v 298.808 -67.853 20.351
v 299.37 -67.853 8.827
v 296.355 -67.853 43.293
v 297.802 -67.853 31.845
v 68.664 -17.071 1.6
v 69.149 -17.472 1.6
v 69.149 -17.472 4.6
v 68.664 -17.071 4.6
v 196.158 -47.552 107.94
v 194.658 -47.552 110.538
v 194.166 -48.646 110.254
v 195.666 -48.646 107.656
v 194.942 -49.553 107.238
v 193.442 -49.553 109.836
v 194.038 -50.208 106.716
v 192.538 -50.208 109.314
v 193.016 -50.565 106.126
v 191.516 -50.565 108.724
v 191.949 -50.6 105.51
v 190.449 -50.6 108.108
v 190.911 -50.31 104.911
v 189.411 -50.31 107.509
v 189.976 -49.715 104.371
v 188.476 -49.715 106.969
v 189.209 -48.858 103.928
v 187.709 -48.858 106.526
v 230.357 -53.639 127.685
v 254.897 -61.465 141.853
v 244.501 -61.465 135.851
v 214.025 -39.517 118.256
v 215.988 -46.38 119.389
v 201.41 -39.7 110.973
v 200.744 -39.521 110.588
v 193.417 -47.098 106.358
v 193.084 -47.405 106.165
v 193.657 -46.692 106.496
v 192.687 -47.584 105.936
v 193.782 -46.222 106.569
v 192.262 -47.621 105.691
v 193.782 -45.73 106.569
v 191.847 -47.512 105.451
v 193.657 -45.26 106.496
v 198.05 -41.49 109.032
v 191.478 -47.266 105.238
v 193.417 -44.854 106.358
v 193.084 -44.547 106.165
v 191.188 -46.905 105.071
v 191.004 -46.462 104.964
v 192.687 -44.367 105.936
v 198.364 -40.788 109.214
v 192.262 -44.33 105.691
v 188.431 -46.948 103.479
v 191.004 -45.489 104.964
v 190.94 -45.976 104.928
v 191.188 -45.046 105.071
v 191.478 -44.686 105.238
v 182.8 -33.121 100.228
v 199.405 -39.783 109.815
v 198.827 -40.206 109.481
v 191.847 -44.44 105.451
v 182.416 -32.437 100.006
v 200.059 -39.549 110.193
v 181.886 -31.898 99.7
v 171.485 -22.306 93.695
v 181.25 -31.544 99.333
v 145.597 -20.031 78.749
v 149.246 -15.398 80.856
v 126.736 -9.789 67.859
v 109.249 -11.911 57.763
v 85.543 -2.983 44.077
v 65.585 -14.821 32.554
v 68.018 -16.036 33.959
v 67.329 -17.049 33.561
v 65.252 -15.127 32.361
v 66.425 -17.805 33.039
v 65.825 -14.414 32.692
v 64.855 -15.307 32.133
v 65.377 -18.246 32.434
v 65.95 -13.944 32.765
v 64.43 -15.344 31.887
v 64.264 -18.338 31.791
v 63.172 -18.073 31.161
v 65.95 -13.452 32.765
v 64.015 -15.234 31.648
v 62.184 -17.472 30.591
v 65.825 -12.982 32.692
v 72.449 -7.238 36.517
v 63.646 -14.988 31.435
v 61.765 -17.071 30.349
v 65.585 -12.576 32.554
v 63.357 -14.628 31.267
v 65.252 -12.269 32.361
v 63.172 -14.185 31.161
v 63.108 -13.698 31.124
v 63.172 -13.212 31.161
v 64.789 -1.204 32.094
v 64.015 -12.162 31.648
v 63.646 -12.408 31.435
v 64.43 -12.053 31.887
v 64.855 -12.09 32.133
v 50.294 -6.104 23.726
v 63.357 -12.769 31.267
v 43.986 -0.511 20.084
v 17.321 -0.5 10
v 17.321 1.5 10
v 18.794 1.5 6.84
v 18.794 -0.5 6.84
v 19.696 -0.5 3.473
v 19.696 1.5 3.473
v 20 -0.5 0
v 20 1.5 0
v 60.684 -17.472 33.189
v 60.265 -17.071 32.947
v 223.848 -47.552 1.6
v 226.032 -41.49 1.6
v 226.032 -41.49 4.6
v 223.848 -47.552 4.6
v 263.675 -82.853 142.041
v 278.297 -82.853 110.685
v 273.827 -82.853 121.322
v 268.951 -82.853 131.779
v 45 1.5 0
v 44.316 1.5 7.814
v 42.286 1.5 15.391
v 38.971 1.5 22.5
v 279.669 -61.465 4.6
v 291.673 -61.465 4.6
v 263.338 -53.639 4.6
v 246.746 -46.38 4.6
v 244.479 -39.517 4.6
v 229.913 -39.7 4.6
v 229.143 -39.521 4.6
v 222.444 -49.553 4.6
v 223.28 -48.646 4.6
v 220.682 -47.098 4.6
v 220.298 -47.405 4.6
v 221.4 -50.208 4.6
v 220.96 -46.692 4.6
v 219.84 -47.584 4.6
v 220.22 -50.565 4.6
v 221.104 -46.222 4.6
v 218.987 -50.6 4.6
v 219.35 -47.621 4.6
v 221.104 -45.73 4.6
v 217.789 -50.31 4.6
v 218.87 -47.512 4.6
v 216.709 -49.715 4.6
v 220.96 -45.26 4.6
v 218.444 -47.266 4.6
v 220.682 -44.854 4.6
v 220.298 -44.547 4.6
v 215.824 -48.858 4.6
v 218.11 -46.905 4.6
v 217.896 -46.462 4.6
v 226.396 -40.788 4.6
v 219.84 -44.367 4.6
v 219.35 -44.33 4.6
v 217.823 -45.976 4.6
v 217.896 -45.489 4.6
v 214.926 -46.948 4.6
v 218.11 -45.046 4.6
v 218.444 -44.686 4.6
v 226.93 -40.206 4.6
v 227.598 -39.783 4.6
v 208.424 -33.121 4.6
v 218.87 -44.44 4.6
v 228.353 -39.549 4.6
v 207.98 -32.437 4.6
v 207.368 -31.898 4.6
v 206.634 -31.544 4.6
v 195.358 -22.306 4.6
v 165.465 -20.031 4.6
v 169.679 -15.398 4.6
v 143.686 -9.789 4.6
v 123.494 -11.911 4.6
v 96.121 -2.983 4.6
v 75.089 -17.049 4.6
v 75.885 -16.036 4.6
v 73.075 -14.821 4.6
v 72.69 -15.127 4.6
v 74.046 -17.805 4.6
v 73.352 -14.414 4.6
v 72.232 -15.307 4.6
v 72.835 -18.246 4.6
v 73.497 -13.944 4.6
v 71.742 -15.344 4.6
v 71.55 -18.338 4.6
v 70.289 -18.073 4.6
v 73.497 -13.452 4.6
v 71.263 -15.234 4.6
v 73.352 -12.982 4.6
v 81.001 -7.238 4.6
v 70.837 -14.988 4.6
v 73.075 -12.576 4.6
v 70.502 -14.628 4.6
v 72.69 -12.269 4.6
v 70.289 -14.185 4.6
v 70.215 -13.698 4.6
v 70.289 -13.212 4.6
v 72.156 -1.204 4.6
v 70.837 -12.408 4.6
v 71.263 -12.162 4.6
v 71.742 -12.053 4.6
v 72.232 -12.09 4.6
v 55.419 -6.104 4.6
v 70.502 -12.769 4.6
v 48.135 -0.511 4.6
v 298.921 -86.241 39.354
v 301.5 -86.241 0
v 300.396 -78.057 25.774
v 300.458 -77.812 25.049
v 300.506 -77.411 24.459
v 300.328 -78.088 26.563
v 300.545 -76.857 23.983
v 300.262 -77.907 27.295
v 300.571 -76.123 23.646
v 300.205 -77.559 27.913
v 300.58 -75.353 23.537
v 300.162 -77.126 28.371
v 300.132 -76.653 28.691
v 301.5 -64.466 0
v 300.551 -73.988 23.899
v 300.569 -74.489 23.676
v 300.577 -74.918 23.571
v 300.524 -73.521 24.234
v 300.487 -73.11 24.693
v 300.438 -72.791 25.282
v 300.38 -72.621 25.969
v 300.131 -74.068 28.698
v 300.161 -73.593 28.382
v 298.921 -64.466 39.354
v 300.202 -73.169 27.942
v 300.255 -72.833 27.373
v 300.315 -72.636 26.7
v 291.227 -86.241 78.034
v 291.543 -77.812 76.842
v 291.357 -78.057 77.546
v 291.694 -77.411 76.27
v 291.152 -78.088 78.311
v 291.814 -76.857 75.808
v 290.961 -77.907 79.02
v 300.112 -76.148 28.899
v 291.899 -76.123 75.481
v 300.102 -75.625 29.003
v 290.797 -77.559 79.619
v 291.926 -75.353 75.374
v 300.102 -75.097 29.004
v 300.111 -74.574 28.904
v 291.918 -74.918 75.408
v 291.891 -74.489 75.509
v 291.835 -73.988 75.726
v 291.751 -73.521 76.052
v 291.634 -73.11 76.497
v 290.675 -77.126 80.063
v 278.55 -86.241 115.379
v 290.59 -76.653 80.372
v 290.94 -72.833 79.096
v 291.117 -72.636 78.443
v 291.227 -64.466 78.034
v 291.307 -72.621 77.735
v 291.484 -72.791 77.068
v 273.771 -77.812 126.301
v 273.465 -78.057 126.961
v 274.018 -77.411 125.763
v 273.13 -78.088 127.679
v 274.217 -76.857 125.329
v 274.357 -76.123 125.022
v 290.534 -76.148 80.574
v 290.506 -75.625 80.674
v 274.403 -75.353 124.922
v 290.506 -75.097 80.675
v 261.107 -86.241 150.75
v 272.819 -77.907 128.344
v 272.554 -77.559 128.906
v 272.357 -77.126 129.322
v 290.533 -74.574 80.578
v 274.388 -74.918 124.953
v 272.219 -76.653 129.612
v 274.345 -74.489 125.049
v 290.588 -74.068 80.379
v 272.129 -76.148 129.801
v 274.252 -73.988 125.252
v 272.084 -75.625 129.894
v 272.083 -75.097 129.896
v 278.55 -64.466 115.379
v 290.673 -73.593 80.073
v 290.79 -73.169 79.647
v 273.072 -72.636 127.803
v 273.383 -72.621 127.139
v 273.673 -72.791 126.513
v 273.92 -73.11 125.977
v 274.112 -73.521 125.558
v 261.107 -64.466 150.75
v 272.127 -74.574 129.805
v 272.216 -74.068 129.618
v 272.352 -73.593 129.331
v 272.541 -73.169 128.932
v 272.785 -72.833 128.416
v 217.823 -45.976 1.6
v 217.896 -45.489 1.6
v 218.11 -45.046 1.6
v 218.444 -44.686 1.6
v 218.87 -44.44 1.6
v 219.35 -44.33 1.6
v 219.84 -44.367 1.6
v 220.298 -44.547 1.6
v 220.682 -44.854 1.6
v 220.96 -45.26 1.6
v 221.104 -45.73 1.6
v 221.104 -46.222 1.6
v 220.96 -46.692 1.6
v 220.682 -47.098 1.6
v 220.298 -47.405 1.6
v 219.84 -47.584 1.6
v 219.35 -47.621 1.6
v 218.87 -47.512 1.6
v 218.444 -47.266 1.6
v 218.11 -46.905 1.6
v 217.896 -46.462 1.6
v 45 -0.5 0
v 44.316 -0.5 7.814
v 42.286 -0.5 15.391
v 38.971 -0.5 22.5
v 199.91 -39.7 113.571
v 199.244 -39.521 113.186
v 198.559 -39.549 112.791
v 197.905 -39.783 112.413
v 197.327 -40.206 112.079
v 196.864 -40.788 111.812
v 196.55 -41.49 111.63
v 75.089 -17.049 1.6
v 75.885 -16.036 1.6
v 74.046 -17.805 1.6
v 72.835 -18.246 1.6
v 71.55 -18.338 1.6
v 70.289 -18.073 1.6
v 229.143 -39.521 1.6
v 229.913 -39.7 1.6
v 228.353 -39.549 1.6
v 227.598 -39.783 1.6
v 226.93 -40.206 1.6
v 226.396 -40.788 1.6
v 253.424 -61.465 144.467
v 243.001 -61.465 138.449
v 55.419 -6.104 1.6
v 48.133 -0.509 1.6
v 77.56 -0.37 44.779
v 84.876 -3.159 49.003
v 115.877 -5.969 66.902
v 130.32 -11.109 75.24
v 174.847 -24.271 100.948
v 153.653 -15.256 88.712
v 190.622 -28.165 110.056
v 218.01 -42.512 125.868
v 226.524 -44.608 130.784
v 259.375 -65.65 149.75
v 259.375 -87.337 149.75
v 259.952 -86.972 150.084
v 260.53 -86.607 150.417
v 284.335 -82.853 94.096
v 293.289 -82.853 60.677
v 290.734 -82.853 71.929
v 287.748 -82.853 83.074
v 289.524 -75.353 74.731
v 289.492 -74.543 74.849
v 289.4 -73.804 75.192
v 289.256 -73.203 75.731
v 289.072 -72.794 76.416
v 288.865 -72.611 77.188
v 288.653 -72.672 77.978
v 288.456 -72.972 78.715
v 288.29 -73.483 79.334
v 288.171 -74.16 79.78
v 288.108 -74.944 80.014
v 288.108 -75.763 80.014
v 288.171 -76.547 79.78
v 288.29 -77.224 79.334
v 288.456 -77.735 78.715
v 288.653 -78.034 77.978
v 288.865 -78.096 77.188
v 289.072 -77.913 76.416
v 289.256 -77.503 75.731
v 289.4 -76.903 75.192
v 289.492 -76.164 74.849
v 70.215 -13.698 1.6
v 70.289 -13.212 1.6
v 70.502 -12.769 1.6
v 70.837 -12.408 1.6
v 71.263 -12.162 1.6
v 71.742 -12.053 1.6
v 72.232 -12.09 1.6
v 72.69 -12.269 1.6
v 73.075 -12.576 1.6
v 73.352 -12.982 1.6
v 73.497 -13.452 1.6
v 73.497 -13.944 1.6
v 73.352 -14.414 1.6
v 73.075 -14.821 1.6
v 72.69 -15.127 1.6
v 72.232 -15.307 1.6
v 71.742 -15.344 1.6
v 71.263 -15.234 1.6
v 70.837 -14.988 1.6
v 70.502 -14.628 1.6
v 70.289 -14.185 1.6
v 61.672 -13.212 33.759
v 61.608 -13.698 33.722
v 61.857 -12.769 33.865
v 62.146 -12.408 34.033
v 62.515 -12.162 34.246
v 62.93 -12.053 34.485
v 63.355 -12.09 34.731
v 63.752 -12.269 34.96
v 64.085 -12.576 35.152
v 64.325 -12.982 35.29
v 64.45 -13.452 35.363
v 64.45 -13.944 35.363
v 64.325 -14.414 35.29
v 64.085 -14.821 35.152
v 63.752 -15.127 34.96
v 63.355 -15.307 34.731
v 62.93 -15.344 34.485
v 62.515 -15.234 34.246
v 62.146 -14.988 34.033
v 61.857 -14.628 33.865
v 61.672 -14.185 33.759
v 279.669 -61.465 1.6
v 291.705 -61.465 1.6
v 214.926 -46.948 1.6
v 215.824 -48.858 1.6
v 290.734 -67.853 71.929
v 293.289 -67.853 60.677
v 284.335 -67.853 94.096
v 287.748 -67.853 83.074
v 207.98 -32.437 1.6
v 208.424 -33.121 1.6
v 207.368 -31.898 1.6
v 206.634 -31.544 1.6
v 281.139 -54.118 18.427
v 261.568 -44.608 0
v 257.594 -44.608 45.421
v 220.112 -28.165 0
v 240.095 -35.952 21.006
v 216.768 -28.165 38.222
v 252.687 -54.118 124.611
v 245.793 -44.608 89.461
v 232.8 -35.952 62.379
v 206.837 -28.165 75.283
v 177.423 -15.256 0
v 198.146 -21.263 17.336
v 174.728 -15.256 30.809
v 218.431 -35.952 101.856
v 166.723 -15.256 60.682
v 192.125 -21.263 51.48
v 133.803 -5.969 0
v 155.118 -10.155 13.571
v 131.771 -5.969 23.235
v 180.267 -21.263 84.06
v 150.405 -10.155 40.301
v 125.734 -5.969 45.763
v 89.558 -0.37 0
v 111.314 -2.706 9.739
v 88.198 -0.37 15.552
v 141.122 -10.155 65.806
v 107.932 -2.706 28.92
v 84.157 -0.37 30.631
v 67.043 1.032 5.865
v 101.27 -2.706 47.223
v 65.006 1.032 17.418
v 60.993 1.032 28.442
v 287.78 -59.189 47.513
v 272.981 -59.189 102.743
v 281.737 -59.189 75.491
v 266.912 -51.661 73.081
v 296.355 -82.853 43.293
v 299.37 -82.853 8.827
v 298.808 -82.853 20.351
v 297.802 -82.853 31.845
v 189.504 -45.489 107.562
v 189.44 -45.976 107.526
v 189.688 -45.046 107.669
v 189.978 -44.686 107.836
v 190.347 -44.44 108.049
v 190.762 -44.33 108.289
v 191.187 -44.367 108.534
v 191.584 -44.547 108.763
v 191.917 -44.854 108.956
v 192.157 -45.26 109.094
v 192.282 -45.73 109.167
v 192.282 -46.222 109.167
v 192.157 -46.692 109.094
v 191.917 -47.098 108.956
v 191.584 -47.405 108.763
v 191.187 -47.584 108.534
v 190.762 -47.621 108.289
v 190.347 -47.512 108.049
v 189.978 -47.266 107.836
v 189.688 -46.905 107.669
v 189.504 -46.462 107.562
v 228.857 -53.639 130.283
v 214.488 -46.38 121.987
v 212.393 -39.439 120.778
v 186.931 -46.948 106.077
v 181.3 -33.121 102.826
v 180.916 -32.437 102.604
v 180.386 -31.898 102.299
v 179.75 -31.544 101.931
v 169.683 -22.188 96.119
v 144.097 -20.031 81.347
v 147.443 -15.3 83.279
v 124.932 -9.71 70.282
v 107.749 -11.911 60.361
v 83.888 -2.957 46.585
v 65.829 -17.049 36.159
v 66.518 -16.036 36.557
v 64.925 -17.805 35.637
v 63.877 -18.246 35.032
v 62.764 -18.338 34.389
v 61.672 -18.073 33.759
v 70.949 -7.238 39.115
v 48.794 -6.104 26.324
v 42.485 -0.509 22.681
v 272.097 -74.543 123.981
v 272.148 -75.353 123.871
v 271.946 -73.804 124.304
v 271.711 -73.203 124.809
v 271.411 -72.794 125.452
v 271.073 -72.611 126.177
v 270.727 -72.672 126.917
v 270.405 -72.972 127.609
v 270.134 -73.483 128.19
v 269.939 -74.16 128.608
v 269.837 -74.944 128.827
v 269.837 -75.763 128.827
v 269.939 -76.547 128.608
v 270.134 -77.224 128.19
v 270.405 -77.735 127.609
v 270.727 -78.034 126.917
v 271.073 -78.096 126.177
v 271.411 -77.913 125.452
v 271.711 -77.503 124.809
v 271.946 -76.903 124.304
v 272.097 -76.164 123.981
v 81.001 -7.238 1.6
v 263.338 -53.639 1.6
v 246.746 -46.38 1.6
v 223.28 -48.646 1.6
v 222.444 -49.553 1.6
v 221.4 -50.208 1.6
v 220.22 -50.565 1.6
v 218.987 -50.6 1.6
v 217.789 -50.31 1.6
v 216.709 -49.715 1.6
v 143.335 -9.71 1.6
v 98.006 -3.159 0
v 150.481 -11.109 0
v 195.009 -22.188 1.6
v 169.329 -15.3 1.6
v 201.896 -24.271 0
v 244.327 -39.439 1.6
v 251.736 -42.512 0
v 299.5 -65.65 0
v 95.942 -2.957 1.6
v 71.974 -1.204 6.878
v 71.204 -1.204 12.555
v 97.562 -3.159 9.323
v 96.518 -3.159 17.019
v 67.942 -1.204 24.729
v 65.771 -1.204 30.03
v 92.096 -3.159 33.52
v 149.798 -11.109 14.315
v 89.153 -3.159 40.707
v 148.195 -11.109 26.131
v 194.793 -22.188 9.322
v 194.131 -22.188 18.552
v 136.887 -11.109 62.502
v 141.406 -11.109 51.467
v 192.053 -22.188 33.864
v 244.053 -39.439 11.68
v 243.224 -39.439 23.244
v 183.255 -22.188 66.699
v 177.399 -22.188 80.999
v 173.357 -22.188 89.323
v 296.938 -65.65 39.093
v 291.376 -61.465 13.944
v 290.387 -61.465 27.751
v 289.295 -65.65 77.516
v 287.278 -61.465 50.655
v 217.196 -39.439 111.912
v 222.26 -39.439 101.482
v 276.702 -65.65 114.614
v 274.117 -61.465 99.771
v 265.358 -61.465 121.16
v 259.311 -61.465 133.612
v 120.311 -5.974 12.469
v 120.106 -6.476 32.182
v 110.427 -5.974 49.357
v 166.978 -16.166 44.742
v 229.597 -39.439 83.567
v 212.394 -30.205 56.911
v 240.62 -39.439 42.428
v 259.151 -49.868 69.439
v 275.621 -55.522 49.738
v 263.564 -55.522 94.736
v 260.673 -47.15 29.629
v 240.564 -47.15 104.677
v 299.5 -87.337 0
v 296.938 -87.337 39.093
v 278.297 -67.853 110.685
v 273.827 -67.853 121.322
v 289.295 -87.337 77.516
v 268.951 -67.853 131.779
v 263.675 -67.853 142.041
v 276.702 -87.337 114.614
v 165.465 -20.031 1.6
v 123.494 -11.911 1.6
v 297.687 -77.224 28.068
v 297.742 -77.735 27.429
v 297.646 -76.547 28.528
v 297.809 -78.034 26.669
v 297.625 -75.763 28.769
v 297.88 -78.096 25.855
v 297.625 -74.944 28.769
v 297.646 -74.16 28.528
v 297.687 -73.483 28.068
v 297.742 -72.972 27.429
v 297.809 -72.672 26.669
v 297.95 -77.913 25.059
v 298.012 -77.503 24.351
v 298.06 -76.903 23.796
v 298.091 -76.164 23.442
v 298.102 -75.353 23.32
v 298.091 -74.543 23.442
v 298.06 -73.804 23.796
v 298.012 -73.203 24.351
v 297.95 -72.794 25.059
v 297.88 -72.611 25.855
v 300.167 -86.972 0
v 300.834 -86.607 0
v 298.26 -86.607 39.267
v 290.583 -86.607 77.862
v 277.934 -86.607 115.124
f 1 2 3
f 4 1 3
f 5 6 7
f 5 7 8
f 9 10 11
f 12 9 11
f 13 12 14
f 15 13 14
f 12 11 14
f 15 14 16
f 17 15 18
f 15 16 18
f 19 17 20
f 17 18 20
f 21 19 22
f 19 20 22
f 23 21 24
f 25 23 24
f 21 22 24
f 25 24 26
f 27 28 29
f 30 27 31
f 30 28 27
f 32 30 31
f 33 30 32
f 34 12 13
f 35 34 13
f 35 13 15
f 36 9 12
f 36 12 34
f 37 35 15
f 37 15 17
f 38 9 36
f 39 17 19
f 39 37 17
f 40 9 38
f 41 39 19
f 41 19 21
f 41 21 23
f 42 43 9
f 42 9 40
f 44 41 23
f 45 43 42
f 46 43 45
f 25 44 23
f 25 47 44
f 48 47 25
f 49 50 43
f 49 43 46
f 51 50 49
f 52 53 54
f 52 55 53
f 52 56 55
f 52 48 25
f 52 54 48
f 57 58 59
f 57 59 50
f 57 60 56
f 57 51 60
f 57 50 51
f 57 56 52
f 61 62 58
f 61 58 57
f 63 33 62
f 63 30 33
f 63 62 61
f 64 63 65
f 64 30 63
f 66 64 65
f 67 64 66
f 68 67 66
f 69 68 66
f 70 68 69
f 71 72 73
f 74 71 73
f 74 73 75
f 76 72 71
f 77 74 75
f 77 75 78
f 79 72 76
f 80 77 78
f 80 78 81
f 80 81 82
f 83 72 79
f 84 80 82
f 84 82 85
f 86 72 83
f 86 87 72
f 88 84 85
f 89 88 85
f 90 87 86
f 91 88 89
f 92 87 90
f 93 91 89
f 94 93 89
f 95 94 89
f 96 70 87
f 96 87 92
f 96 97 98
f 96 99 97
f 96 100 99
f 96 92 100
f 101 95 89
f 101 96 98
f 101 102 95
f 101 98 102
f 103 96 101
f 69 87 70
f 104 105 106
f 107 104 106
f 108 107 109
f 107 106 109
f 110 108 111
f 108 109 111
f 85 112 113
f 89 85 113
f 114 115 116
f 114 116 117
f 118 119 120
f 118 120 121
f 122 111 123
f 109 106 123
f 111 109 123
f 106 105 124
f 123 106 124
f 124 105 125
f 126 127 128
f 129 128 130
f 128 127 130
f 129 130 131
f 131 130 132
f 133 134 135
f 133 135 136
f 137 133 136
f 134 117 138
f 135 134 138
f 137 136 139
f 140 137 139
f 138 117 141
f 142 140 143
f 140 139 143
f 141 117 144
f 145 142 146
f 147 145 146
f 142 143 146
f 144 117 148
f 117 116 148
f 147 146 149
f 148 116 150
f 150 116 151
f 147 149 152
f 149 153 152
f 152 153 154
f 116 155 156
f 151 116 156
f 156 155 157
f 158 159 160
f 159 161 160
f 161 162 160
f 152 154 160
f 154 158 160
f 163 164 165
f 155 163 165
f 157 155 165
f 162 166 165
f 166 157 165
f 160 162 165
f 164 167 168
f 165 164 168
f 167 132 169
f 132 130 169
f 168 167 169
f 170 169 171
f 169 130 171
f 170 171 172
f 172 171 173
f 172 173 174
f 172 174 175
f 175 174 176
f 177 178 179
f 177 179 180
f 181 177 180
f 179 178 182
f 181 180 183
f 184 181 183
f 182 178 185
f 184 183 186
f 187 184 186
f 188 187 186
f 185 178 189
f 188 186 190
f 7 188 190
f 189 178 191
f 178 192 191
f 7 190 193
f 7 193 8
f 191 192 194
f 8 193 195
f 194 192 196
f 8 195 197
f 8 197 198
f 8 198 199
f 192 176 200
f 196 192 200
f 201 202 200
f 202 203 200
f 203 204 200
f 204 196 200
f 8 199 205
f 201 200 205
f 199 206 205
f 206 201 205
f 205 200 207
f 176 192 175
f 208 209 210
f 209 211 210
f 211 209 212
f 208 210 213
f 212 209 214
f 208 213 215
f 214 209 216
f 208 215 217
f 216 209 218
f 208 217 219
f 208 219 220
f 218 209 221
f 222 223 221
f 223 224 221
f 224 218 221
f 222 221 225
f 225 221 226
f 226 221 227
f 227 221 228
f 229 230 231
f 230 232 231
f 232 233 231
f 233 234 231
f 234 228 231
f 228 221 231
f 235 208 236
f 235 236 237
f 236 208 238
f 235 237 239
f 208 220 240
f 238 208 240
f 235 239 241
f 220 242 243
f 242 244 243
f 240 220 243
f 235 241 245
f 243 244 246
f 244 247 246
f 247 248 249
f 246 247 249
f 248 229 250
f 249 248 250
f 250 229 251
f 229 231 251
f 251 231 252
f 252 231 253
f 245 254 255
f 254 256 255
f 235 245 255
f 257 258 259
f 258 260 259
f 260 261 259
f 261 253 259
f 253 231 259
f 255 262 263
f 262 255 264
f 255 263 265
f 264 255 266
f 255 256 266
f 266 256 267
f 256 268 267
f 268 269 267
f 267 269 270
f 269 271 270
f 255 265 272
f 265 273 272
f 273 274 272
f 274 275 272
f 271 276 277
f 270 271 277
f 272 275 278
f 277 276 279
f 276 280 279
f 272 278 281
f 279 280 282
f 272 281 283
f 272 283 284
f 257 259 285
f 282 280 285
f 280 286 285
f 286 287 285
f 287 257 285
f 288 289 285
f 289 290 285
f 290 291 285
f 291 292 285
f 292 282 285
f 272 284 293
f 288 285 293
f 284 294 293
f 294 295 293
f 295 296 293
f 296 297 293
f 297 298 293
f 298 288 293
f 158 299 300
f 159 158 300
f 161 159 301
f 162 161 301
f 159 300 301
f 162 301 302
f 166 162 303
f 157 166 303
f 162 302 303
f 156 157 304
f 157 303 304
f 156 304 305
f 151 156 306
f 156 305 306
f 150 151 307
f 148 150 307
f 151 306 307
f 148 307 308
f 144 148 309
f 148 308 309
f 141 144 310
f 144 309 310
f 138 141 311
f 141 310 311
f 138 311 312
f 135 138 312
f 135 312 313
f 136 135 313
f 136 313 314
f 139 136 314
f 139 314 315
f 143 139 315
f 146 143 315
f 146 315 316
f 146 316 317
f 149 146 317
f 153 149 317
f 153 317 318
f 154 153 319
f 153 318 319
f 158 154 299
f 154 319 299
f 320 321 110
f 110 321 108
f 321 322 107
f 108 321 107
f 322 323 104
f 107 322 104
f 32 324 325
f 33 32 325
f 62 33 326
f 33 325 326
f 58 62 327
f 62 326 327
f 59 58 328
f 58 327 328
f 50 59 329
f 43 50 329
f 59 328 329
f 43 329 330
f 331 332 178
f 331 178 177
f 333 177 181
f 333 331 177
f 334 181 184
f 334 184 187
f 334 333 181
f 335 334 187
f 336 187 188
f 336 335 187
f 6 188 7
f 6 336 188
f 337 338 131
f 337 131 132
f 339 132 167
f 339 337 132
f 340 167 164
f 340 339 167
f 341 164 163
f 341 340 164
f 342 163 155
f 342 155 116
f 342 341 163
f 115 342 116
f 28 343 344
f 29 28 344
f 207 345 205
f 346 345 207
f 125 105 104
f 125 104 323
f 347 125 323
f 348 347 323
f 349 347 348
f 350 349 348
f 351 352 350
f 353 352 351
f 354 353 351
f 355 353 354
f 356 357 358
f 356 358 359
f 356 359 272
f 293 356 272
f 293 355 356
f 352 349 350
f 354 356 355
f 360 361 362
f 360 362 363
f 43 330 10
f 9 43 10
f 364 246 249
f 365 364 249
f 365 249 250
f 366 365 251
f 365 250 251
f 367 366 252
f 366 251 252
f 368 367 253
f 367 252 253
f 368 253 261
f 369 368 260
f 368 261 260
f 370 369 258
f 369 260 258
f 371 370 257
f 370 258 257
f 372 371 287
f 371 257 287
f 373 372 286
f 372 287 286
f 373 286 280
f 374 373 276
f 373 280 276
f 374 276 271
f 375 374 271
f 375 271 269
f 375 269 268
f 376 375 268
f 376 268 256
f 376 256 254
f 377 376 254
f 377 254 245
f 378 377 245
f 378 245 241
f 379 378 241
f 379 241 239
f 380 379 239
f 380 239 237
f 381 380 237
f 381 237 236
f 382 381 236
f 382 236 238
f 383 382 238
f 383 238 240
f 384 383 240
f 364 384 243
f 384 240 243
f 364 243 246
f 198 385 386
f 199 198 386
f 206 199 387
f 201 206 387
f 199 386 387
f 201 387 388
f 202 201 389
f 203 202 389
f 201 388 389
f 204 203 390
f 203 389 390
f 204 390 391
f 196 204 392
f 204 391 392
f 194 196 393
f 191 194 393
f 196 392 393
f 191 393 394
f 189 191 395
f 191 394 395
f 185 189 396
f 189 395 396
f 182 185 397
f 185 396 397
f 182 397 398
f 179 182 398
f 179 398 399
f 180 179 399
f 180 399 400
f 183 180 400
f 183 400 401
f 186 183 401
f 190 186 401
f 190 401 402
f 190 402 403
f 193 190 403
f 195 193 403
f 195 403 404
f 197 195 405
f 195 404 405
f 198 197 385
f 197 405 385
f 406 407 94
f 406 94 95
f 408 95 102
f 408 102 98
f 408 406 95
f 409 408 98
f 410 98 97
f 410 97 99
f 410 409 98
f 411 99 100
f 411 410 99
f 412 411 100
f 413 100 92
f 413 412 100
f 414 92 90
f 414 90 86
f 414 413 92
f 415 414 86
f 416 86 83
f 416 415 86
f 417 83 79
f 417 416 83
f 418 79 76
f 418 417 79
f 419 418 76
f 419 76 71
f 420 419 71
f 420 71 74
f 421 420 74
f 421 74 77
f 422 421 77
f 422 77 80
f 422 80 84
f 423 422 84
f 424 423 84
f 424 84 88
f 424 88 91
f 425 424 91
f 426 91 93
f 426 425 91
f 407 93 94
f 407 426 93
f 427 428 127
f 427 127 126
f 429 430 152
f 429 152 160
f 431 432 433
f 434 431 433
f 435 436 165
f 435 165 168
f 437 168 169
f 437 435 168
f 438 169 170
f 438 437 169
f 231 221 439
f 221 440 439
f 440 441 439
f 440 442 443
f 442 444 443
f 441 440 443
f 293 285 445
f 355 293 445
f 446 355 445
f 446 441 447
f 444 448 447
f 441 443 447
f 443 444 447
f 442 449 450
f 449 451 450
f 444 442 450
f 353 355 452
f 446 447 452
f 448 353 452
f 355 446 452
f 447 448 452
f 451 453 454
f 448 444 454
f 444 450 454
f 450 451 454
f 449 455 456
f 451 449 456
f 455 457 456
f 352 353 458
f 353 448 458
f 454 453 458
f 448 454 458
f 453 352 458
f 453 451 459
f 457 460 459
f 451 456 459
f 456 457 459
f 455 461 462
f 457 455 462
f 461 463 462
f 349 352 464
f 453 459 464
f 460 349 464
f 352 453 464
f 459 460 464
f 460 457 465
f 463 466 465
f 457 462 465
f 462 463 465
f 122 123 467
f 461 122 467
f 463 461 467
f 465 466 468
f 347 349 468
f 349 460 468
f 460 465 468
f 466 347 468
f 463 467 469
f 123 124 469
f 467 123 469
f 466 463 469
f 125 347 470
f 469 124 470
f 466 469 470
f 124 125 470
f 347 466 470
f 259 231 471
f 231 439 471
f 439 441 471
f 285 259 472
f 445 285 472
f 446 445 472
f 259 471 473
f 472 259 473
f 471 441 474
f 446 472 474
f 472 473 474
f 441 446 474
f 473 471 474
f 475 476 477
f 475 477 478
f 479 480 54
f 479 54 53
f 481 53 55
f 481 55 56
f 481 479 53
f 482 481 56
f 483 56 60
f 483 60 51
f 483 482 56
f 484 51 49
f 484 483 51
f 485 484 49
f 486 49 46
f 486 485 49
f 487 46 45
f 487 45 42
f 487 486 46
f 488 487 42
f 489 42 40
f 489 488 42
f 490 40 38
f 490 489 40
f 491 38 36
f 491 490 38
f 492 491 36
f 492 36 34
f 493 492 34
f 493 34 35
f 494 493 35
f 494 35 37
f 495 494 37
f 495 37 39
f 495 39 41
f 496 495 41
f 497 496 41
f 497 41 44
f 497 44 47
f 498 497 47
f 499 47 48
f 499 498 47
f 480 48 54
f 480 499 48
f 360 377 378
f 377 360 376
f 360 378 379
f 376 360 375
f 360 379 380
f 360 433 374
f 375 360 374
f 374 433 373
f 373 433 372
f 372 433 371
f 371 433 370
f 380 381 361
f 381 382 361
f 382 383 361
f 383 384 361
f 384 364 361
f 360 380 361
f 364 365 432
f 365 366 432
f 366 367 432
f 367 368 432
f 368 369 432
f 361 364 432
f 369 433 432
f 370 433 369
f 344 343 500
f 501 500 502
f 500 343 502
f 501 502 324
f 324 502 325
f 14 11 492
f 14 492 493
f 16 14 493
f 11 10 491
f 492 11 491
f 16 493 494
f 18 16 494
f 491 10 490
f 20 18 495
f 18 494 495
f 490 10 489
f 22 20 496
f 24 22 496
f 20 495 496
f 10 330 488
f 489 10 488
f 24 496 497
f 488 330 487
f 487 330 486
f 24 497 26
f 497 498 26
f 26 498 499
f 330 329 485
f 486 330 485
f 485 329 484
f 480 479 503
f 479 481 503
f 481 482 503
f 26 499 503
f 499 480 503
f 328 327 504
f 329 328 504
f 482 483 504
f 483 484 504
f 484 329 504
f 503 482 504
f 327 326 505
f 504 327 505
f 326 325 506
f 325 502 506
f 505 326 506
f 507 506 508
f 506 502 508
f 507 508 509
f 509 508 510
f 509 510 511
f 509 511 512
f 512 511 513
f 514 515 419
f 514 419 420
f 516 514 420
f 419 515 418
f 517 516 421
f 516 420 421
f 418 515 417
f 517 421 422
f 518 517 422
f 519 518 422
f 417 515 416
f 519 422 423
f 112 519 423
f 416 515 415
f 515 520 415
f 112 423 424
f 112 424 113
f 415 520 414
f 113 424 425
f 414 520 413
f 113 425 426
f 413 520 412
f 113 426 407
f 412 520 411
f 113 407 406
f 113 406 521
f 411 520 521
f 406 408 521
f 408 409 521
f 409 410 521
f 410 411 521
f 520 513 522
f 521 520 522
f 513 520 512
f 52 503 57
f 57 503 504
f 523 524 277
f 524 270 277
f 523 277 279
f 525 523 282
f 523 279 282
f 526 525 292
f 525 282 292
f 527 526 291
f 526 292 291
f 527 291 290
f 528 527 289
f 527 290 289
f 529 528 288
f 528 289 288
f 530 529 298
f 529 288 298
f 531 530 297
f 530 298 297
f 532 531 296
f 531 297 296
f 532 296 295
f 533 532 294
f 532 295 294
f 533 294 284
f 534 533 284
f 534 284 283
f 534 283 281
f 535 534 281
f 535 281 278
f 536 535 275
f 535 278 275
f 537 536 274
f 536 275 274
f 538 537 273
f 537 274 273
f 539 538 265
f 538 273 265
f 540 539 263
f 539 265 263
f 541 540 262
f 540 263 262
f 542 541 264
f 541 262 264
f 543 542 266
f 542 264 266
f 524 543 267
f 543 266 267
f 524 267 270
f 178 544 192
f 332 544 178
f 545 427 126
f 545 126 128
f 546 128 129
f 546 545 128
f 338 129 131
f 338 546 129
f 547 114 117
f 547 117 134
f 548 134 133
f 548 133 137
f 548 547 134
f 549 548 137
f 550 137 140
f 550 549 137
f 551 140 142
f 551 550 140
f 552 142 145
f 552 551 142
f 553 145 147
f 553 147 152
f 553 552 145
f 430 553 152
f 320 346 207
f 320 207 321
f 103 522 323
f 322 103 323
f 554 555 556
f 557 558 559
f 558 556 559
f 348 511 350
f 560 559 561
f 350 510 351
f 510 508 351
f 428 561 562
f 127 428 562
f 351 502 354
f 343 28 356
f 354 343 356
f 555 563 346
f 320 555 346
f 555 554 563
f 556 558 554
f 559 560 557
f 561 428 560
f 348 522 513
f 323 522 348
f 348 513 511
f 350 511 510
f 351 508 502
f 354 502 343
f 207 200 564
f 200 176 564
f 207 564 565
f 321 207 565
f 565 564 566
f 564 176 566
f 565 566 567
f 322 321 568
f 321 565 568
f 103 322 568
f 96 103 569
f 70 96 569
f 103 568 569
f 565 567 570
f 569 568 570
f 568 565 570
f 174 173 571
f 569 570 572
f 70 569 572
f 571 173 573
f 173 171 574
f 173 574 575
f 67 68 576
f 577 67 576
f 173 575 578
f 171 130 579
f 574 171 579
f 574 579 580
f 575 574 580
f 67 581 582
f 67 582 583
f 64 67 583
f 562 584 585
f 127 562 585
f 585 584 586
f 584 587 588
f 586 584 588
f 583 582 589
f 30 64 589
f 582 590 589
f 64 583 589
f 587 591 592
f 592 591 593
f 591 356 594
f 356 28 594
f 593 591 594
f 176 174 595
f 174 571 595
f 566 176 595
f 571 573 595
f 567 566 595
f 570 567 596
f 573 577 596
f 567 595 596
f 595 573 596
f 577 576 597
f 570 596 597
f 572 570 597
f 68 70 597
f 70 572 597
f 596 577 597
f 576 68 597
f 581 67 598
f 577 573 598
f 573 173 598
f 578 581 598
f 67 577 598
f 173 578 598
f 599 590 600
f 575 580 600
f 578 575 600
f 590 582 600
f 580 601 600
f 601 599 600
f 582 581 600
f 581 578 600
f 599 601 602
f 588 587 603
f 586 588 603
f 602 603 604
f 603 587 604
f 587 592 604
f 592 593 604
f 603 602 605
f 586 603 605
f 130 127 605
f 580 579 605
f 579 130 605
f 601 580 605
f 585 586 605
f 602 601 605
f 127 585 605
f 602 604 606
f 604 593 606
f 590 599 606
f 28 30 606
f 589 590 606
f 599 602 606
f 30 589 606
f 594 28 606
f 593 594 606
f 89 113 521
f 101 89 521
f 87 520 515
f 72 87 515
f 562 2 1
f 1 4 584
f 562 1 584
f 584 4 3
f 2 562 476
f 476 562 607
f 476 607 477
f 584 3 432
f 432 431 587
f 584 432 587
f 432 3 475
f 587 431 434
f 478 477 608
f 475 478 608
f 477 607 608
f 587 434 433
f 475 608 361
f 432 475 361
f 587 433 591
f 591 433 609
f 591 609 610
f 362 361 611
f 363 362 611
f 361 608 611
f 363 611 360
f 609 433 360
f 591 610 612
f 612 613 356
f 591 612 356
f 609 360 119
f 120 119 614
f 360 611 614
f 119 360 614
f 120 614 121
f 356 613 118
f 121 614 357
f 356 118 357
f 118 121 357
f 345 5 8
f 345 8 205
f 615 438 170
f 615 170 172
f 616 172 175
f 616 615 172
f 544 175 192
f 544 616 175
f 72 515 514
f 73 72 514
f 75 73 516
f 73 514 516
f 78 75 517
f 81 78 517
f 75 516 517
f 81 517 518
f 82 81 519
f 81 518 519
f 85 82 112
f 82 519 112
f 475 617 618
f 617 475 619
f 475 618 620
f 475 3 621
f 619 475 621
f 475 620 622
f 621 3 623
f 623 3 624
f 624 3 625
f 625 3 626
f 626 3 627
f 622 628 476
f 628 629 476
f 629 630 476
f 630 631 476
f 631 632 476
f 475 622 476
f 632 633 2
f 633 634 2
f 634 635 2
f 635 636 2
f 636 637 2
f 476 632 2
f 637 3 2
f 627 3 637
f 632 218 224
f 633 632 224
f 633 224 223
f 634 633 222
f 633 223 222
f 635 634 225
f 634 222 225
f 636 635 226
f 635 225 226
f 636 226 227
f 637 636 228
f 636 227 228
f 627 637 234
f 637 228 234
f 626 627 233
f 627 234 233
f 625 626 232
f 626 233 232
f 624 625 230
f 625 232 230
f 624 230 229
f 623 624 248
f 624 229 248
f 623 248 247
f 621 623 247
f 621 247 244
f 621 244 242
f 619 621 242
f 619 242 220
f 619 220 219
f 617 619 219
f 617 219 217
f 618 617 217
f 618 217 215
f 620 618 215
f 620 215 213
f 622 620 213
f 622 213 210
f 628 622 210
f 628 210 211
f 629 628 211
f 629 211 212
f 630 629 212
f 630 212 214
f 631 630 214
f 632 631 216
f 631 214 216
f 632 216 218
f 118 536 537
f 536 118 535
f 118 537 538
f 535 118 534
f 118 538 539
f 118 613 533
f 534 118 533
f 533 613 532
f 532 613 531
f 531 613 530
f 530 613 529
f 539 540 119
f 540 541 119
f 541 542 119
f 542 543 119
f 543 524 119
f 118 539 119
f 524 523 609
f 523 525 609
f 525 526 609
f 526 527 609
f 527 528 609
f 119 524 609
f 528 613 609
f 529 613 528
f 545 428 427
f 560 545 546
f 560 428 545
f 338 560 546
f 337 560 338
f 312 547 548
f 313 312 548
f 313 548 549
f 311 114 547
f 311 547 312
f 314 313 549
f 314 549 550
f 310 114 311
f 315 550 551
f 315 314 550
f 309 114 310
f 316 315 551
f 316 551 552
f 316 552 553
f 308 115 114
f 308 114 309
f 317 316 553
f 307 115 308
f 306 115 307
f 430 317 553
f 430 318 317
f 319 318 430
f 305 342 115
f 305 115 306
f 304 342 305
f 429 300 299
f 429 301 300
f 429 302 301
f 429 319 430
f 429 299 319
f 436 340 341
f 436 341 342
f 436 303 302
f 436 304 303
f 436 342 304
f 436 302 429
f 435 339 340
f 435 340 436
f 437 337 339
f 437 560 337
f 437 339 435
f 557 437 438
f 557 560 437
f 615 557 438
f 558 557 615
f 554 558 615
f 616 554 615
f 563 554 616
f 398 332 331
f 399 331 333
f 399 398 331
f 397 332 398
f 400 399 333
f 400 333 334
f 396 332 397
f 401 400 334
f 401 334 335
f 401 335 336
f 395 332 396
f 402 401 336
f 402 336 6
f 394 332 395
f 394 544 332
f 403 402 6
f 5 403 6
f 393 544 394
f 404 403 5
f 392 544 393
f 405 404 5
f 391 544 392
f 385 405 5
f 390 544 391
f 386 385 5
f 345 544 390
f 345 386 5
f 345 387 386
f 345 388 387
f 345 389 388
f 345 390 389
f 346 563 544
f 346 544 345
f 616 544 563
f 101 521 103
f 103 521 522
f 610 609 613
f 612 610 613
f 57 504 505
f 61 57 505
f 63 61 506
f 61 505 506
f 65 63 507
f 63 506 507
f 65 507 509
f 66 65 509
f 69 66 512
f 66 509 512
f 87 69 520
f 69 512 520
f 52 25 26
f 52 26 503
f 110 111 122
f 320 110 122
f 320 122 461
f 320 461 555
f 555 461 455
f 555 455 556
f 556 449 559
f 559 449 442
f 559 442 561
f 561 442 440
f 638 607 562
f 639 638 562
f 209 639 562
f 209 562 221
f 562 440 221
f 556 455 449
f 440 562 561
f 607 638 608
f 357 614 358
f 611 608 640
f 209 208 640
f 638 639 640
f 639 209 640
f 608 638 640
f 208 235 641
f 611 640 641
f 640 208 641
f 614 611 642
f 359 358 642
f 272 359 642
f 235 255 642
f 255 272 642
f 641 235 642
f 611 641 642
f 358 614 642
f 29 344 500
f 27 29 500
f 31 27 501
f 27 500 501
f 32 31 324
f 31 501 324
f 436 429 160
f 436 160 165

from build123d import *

# Parameters (mm, degrees)
REVOLVE1_ANGLE      = 30
SKETCH8_R           = 20
CUT_EXTRUDE1_DEPTH  = 10
SKETCH9_R           = 1.65
BOSS_EXTRUDE1_DEPTH = 3
BOSS_EXTRUDE2_DEPTH = 7.5
SKETCH10_R          = 2.75
CUT_EXTRUDE2_DEPTH  = 322.291633421
CIRPATTERN1_COUNT   = 3
CIRPATTERN1_ANGLE   = 20


with BuildPart() as part:
    # Sketch7 → Revolve1 (revolve)
    with BuildSketch(Plane.XY):
        with BuildLine():
            Line((45, 1.5), (0, 1.5))
            Line((0, 1.5), (0, -0.5))
            Line((0, -0.5), (0.5, -0.5))
            Line((0.5, -0.5), (45, -0.5))
            ThreePointArc((45, -0.5), (176.353256324, -17.04581533), (299.5, -65.649534053))
            Line((299.5, -65.649534053), (299.5, -85.057353814))
            Line((299.5, -85.057353814), (299.5, -87.3365737))
            ThreePointArc((299.5, -87.3365737), (300.500587667, -86.78965163), (301.5, -86.24058477))
            Line((301.5, -86.24058477), (301.5, -64.466303097))
            ThreePointArc((301.5, -64.466303097), (177.423377038, -15.255605667), (45, 1.5))
        make_face()
    revolve(axis=Axis((0, 0, 0), (0, -1, 0)), revolution_arc=REVOLVE1_ANGLE)

    # Sketch8 → Cut-Extrude1 (cut)
    with BuildSketch(Plane(origin=(0, 1.5, 0), x_dir=(1, 0, 0), z_dir=(0, 1, 0))):
        Circle(SKETCH8_R)
    extrude(amount=-CUT_EXTRUDE1_DEPTH, mode=Mode.SUBTRACT)

    # Sketch9 → Boss-Extrude1 (add)
    with BuildSketch(Plane(origin=(0, 0, 1.6), x_dir=(-1, 0, 0), z_dir=(0, 0, -1))):
        with BuildLine():
            ThreePointArc((-47.477373191, -0.005788221), (-173.847460419, -15.895397549), (-292.781250831, -61.465476862))
            Line((-292.781250831, -61.465476862), (-279.669089435, -61.465476862))
            ThreePointArc((-279.669089435, -61.465476862), (-255.073001384, -49.937778659), (-229.91274685, -39.699762977))
            ThreePointArc((-229.91274685, -39.699762977), (-227.597805944, -39.782747629), (-226.032061896, -41.489874873))
            Line((-226.032061896, -41.489874873), (-223.847573085, -47.552153691))
            ThreePointArc((-223.847573085, -47.552153691), (-220.219756041, -50.565420802), (-215.82374839, -48.857804945))
            Line((-215.82374839, -48.857804945), (-214.925668504, -46.947888182))
            Line((-214.925668504, -46.947888182), (-208.423927791, -33.120851453))
            ThreePointArc((-208.423927791, -33.120851453), (-207.69256892, -32.146690461), (-206.634183209, -31.543619054))
            ThreePointArc((-206.634183209, -31.543619054), (-144.562309401, -15.54254357), (-81.001445464, -7.237815383))
            Line((-81.001445464, -7.237815383), (-75.885042341, -16.035876247))
            ThreePointArc((-75.885042341, -16.035876247), (-72.834885241, -18.246061874), (-69.148521267, -17.472046696))
            Line((-69.148521267, -17.472046696), (-68.664438088, -17.071211426))
            Line((-68.664438088, -17.071211426), (-55.418958748, -6.103560573))
            Line((-55.418958748, -6.103560573), (-47.477373191, -0.005788221))
        make_face()
        with Locations((-219.472922513, -45.975786864)):
            Circle(SKETCH9_R, mode=Mode.SUBTRACT)
        with Locations((-71.865332392, -13.698263805)):
            Circle(SKETCH9_R, mode=Mode.SUBTRACT)
    boss_extrude1 = extrude(amount=-BOSS_EXTRUDE1_DEPTH)

    # Mirror1: Boss-Extrude1 across plane
    add(boss_extrude1.mirror(Plane(origin=(0, 0, 0), x_dir=(0.9659258262890681, 0, 0.2588190451025213), z_dir=(0.2588190451025213, 0, -0.9659258262890682))))

    # Sketch11 → Boss-Extrude2 (add, symmetric)
    with BuildSketch(Plane(origin=(0, -75.353443934, 0), x_dir=(1, 0, 0), z_dir=(0, 1, 0))):
        with BuildLine():
            Line((296.354521141, -43.29258365), (299.369908318, -8.826550513))
            ThreePointArc((299.369908318, -8.826550513), (298.360312078, -26.103144953), (296.354521141, -43.29258365))
        make_face()
    boss_extrude2 = extrude(amount=BOSS_EXTRUDE2_DEPTH, both=True)

    # Sketch10 → Cut-Extrude2 (cut, through all)
    with BuildSketch(Plane(origin=(300.352701475, 0, 26.277456438), x_dir=(0.08715574274765836, 0, -0.9961946980917455), z_dir=(0.9961946980917457, 0, 0.08715574274765837))):
        with Locations((0, -75.353443934)):
            Circle(SKETCH10_R)
    cut_extrude2 = extrude(amount=-CUT_EXTRUDE2_DEPTH, mode=Mode.SUBTRACT)

    # CirPattern1: Boss-Extrude2, Cut-Extrude2 ×3 about axis
    cirpattern1_axis = Axis((0, 0, 0), (0, -1, 0))
    add([boss_extrude2.rotate(cirpattern1_axis, i * CIRPATTERN1_ANGLE / (CIRPATTERN1_COUNT - 1)) for i in range(1, CIRPATTERN1_COUNT)])
    add([cut_extrude2.rotate(cirpattern1_axis, i * CIRPATTERN1_ANGLE / (CIRPATTERN1_COUNT - 1)) for i in range(1, CIRPATTERN1_COUNT)], mode=Mode.SUBTRACT)


solid = part.part
